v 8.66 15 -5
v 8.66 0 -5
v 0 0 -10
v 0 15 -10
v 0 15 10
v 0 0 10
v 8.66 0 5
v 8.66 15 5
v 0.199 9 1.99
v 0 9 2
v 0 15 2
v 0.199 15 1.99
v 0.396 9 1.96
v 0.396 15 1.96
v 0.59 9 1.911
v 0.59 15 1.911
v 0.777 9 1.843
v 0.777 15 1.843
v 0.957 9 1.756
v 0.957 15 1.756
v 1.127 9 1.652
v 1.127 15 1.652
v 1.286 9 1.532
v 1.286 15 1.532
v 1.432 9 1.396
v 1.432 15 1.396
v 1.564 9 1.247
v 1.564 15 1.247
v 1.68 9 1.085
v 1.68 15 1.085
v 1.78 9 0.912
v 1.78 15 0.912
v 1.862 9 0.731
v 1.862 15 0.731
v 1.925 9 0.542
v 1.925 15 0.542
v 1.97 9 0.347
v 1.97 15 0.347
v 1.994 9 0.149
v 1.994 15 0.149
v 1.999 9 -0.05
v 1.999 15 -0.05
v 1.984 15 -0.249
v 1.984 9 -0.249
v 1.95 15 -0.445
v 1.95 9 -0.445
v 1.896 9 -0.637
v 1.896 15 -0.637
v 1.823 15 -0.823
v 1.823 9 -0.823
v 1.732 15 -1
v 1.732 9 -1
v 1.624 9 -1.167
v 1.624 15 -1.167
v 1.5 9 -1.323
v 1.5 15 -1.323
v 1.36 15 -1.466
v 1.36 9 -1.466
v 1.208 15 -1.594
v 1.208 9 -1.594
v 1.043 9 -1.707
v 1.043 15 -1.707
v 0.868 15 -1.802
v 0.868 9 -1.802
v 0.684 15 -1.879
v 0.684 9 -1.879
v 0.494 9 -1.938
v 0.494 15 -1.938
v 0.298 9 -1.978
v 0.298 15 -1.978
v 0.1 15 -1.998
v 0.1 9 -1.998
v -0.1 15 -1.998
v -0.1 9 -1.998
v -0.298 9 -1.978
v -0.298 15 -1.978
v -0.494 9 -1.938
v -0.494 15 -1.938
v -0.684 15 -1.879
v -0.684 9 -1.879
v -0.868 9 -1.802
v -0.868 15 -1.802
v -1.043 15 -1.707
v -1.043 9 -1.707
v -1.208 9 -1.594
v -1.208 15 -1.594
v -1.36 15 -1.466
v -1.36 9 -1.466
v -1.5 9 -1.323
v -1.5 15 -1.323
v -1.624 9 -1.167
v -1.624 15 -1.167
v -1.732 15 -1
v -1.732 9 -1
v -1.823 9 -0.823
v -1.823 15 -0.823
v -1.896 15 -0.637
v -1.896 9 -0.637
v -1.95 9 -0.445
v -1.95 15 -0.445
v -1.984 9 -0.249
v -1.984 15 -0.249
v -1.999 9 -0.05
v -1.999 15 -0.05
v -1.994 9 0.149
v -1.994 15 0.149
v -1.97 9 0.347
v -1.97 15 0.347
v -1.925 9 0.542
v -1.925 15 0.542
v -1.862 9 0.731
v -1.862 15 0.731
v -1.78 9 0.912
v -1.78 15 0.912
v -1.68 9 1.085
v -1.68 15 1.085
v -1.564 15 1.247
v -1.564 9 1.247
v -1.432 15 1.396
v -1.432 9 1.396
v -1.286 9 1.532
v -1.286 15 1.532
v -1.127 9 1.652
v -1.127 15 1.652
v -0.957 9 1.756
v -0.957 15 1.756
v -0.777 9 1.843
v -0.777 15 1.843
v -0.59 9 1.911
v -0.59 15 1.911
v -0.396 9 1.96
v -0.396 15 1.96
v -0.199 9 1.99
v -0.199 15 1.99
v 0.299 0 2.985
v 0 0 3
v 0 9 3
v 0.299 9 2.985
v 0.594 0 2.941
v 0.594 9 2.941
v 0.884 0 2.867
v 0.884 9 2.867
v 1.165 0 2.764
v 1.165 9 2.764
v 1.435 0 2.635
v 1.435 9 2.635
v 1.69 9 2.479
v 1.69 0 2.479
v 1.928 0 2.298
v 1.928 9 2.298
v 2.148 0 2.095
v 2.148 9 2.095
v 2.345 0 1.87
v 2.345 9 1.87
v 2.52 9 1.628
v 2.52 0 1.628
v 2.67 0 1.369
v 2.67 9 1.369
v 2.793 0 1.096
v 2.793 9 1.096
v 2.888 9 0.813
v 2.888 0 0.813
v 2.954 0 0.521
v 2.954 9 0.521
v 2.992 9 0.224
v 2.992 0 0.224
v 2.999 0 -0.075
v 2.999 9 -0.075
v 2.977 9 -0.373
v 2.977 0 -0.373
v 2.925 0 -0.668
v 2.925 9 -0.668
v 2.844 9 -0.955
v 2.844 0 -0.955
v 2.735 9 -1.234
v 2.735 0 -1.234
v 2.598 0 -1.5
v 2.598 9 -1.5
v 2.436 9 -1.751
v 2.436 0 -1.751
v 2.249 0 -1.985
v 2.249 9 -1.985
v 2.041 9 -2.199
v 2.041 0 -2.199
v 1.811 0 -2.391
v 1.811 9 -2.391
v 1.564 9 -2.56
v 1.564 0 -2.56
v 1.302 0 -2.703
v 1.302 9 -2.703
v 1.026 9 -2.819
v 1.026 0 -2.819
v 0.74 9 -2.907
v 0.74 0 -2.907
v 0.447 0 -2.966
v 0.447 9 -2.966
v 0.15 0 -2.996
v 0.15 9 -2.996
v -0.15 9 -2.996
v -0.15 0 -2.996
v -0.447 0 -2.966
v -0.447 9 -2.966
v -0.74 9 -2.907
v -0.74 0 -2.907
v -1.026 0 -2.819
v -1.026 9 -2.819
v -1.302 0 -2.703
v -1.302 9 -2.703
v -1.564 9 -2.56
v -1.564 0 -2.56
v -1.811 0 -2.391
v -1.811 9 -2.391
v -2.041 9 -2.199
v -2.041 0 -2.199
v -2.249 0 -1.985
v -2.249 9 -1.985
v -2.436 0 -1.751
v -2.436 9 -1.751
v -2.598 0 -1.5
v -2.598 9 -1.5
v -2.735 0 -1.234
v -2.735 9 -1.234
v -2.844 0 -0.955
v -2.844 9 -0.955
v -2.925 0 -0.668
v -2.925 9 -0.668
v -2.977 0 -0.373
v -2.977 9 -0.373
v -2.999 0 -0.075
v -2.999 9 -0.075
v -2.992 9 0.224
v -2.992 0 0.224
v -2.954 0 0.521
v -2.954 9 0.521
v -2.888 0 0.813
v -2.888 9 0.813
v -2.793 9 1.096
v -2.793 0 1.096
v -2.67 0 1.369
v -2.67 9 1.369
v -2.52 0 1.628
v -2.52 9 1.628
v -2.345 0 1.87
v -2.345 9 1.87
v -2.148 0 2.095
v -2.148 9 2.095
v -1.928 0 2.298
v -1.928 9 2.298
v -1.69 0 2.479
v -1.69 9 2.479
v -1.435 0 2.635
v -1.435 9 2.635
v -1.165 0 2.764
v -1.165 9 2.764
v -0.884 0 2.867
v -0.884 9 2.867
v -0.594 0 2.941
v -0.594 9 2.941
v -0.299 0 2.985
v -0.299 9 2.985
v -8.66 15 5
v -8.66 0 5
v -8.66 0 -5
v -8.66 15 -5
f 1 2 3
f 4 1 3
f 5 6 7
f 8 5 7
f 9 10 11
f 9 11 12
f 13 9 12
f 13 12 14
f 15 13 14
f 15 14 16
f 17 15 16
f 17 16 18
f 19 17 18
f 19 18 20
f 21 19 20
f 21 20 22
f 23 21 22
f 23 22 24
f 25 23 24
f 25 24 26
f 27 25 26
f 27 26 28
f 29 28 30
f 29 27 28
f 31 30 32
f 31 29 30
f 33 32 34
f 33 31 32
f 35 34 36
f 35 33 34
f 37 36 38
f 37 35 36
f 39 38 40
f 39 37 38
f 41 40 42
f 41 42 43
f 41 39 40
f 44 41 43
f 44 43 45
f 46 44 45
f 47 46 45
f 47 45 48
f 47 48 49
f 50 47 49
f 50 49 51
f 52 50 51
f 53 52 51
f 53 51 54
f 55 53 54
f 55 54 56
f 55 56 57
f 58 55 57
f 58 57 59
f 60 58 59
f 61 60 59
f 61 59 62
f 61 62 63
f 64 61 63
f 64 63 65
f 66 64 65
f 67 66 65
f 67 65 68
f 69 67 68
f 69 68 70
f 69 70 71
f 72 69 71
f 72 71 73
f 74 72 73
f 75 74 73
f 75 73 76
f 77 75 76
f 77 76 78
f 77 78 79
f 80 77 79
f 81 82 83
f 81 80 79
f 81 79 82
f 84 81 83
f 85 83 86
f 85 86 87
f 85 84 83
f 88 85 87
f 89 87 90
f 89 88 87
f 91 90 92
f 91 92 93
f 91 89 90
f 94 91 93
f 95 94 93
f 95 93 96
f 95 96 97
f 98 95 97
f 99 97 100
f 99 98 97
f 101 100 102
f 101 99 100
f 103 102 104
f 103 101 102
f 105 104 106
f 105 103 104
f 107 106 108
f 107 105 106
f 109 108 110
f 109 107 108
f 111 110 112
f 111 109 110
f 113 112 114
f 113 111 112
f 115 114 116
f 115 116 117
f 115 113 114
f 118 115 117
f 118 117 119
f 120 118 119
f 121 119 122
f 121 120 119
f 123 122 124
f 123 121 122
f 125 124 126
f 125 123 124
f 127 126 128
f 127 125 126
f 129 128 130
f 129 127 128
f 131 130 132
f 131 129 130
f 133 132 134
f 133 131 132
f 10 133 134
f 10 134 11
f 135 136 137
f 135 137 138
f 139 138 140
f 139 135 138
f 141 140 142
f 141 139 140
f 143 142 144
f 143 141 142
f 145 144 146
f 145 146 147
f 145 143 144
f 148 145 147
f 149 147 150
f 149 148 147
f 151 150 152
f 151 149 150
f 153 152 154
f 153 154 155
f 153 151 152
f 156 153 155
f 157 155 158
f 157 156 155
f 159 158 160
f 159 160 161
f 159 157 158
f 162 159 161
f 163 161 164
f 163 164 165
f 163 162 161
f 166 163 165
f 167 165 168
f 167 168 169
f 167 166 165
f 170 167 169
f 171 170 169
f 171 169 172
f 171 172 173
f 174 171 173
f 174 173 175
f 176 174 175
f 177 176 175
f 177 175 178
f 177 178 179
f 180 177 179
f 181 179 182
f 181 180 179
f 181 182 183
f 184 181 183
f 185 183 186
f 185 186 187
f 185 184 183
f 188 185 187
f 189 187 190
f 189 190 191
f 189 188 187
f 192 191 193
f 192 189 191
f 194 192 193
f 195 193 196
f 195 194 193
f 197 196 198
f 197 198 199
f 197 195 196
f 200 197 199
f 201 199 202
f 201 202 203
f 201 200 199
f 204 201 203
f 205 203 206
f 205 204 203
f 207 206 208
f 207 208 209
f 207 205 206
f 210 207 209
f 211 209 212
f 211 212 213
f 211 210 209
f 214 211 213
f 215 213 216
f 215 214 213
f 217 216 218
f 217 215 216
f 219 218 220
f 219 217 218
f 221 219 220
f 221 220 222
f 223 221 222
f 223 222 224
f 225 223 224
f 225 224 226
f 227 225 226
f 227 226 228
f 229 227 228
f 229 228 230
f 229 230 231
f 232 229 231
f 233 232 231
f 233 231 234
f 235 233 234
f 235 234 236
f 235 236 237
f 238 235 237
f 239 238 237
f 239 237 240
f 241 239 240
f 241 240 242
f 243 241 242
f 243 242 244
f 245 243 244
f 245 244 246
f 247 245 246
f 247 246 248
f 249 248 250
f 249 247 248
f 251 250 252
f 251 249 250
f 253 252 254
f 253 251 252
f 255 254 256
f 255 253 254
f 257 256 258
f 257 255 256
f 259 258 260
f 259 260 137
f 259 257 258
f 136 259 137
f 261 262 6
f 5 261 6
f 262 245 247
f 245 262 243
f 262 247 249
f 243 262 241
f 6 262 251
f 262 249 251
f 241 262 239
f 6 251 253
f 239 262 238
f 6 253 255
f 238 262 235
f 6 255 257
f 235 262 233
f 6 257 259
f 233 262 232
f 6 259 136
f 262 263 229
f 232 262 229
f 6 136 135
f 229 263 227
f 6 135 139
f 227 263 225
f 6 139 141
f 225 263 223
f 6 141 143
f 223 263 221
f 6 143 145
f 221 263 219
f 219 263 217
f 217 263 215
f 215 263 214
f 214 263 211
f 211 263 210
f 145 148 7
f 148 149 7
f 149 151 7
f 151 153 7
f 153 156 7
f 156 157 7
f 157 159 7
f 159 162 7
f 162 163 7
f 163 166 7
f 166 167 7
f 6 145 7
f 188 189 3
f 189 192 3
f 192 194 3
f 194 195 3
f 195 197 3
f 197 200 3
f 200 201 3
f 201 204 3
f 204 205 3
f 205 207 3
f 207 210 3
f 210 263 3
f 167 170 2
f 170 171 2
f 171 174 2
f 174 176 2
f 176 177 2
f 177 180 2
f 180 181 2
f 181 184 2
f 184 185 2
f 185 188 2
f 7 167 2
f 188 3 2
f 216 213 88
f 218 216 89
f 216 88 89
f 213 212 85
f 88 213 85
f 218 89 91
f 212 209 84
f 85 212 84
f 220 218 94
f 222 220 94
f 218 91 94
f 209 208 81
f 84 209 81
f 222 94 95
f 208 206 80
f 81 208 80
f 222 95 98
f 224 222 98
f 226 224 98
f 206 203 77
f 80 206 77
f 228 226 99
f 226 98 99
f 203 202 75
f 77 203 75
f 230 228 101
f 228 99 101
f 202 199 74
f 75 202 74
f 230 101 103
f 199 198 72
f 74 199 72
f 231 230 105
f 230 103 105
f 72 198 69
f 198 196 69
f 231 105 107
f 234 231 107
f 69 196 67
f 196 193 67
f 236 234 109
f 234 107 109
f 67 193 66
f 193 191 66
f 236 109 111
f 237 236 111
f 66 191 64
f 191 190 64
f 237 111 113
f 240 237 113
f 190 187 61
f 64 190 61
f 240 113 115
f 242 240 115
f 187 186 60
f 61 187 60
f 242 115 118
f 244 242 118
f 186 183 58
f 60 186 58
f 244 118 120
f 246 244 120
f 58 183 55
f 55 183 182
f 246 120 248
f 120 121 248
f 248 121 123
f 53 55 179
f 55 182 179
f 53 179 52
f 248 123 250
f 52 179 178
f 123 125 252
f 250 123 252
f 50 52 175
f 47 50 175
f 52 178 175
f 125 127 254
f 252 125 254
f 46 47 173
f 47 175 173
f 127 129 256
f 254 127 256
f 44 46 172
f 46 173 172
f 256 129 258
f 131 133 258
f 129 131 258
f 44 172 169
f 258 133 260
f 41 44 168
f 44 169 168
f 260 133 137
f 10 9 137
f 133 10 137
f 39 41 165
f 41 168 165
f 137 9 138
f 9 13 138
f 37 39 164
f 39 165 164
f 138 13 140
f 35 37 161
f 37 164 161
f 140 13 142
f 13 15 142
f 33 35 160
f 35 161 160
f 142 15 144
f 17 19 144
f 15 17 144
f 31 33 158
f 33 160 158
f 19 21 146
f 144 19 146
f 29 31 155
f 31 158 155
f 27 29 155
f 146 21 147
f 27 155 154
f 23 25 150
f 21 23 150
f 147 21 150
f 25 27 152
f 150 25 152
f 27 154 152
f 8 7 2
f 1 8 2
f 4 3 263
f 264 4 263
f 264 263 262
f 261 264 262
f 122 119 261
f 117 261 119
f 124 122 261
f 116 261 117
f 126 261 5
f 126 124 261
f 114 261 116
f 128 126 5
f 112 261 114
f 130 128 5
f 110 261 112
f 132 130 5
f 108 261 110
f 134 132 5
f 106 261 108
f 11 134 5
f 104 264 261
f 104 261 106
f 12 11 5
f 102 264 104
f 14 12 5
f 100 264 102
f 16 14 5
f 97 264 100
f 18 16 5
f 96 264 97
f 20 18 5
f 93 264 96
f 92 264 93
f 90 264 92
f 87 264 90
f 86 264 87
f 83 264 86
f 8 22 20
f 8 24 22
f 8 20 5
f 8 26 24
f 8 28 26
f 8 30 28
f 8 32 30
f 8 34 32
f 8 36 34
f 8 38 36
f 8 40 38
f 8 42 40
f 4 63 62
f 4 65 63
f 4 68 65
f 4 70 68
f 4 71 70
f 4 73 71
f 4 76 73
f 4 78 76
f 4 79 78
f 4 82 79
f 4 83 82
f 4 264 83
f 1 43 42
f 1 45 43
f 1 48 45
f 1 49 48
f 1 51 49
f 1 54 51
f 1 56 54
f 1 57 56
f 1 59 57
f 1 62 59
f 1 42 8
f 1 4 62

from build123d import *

# Parameters (mm, degrees)
SKETCH2_R           = 2
BOSS_EXTRUDE1_DEPTH = 15
SKETCH2_4_R         = 3
SKETCH2_4_R_2       = 2
CUT_EXTRUDE1_DEPTH  = 9


with BuildPart() as part:
    # Sketch2 → Boss-Extrude1 (new body)
    with BuildSketch(Plane(origin=(0, 0, 0), x_dir=(1, 0, 0), z_dir=(0, 1, 0))):
        Polygon((8.660254038, 5), (0, 10), (-8.660254038, 5), (-8.660254038, -5), (0, -10), (8.660254038, -5), align=None)
        Circle(SKETCH2_R, mode=Mode.SUBTRACT)
    extrude(amount=BOSS_EXTRUDE1_DEPTH)

    # Sketch2<4> → Cut-Extrude1 (cut)
    with BuildSketch(Plane(origin=(0, 0, 0), x_dir=(1, 0, 0), z_dir=(0, 1, 0))):
        Circle(SKETCH2_4_R)
        Circle(SKETCH2_4_R_2, mode=Mode.SUBTRACT)
    extrude(amount=CUT_EXTRUDE1_DEPTH, mode=Mode.SUBTRACT)


solid = part.part
